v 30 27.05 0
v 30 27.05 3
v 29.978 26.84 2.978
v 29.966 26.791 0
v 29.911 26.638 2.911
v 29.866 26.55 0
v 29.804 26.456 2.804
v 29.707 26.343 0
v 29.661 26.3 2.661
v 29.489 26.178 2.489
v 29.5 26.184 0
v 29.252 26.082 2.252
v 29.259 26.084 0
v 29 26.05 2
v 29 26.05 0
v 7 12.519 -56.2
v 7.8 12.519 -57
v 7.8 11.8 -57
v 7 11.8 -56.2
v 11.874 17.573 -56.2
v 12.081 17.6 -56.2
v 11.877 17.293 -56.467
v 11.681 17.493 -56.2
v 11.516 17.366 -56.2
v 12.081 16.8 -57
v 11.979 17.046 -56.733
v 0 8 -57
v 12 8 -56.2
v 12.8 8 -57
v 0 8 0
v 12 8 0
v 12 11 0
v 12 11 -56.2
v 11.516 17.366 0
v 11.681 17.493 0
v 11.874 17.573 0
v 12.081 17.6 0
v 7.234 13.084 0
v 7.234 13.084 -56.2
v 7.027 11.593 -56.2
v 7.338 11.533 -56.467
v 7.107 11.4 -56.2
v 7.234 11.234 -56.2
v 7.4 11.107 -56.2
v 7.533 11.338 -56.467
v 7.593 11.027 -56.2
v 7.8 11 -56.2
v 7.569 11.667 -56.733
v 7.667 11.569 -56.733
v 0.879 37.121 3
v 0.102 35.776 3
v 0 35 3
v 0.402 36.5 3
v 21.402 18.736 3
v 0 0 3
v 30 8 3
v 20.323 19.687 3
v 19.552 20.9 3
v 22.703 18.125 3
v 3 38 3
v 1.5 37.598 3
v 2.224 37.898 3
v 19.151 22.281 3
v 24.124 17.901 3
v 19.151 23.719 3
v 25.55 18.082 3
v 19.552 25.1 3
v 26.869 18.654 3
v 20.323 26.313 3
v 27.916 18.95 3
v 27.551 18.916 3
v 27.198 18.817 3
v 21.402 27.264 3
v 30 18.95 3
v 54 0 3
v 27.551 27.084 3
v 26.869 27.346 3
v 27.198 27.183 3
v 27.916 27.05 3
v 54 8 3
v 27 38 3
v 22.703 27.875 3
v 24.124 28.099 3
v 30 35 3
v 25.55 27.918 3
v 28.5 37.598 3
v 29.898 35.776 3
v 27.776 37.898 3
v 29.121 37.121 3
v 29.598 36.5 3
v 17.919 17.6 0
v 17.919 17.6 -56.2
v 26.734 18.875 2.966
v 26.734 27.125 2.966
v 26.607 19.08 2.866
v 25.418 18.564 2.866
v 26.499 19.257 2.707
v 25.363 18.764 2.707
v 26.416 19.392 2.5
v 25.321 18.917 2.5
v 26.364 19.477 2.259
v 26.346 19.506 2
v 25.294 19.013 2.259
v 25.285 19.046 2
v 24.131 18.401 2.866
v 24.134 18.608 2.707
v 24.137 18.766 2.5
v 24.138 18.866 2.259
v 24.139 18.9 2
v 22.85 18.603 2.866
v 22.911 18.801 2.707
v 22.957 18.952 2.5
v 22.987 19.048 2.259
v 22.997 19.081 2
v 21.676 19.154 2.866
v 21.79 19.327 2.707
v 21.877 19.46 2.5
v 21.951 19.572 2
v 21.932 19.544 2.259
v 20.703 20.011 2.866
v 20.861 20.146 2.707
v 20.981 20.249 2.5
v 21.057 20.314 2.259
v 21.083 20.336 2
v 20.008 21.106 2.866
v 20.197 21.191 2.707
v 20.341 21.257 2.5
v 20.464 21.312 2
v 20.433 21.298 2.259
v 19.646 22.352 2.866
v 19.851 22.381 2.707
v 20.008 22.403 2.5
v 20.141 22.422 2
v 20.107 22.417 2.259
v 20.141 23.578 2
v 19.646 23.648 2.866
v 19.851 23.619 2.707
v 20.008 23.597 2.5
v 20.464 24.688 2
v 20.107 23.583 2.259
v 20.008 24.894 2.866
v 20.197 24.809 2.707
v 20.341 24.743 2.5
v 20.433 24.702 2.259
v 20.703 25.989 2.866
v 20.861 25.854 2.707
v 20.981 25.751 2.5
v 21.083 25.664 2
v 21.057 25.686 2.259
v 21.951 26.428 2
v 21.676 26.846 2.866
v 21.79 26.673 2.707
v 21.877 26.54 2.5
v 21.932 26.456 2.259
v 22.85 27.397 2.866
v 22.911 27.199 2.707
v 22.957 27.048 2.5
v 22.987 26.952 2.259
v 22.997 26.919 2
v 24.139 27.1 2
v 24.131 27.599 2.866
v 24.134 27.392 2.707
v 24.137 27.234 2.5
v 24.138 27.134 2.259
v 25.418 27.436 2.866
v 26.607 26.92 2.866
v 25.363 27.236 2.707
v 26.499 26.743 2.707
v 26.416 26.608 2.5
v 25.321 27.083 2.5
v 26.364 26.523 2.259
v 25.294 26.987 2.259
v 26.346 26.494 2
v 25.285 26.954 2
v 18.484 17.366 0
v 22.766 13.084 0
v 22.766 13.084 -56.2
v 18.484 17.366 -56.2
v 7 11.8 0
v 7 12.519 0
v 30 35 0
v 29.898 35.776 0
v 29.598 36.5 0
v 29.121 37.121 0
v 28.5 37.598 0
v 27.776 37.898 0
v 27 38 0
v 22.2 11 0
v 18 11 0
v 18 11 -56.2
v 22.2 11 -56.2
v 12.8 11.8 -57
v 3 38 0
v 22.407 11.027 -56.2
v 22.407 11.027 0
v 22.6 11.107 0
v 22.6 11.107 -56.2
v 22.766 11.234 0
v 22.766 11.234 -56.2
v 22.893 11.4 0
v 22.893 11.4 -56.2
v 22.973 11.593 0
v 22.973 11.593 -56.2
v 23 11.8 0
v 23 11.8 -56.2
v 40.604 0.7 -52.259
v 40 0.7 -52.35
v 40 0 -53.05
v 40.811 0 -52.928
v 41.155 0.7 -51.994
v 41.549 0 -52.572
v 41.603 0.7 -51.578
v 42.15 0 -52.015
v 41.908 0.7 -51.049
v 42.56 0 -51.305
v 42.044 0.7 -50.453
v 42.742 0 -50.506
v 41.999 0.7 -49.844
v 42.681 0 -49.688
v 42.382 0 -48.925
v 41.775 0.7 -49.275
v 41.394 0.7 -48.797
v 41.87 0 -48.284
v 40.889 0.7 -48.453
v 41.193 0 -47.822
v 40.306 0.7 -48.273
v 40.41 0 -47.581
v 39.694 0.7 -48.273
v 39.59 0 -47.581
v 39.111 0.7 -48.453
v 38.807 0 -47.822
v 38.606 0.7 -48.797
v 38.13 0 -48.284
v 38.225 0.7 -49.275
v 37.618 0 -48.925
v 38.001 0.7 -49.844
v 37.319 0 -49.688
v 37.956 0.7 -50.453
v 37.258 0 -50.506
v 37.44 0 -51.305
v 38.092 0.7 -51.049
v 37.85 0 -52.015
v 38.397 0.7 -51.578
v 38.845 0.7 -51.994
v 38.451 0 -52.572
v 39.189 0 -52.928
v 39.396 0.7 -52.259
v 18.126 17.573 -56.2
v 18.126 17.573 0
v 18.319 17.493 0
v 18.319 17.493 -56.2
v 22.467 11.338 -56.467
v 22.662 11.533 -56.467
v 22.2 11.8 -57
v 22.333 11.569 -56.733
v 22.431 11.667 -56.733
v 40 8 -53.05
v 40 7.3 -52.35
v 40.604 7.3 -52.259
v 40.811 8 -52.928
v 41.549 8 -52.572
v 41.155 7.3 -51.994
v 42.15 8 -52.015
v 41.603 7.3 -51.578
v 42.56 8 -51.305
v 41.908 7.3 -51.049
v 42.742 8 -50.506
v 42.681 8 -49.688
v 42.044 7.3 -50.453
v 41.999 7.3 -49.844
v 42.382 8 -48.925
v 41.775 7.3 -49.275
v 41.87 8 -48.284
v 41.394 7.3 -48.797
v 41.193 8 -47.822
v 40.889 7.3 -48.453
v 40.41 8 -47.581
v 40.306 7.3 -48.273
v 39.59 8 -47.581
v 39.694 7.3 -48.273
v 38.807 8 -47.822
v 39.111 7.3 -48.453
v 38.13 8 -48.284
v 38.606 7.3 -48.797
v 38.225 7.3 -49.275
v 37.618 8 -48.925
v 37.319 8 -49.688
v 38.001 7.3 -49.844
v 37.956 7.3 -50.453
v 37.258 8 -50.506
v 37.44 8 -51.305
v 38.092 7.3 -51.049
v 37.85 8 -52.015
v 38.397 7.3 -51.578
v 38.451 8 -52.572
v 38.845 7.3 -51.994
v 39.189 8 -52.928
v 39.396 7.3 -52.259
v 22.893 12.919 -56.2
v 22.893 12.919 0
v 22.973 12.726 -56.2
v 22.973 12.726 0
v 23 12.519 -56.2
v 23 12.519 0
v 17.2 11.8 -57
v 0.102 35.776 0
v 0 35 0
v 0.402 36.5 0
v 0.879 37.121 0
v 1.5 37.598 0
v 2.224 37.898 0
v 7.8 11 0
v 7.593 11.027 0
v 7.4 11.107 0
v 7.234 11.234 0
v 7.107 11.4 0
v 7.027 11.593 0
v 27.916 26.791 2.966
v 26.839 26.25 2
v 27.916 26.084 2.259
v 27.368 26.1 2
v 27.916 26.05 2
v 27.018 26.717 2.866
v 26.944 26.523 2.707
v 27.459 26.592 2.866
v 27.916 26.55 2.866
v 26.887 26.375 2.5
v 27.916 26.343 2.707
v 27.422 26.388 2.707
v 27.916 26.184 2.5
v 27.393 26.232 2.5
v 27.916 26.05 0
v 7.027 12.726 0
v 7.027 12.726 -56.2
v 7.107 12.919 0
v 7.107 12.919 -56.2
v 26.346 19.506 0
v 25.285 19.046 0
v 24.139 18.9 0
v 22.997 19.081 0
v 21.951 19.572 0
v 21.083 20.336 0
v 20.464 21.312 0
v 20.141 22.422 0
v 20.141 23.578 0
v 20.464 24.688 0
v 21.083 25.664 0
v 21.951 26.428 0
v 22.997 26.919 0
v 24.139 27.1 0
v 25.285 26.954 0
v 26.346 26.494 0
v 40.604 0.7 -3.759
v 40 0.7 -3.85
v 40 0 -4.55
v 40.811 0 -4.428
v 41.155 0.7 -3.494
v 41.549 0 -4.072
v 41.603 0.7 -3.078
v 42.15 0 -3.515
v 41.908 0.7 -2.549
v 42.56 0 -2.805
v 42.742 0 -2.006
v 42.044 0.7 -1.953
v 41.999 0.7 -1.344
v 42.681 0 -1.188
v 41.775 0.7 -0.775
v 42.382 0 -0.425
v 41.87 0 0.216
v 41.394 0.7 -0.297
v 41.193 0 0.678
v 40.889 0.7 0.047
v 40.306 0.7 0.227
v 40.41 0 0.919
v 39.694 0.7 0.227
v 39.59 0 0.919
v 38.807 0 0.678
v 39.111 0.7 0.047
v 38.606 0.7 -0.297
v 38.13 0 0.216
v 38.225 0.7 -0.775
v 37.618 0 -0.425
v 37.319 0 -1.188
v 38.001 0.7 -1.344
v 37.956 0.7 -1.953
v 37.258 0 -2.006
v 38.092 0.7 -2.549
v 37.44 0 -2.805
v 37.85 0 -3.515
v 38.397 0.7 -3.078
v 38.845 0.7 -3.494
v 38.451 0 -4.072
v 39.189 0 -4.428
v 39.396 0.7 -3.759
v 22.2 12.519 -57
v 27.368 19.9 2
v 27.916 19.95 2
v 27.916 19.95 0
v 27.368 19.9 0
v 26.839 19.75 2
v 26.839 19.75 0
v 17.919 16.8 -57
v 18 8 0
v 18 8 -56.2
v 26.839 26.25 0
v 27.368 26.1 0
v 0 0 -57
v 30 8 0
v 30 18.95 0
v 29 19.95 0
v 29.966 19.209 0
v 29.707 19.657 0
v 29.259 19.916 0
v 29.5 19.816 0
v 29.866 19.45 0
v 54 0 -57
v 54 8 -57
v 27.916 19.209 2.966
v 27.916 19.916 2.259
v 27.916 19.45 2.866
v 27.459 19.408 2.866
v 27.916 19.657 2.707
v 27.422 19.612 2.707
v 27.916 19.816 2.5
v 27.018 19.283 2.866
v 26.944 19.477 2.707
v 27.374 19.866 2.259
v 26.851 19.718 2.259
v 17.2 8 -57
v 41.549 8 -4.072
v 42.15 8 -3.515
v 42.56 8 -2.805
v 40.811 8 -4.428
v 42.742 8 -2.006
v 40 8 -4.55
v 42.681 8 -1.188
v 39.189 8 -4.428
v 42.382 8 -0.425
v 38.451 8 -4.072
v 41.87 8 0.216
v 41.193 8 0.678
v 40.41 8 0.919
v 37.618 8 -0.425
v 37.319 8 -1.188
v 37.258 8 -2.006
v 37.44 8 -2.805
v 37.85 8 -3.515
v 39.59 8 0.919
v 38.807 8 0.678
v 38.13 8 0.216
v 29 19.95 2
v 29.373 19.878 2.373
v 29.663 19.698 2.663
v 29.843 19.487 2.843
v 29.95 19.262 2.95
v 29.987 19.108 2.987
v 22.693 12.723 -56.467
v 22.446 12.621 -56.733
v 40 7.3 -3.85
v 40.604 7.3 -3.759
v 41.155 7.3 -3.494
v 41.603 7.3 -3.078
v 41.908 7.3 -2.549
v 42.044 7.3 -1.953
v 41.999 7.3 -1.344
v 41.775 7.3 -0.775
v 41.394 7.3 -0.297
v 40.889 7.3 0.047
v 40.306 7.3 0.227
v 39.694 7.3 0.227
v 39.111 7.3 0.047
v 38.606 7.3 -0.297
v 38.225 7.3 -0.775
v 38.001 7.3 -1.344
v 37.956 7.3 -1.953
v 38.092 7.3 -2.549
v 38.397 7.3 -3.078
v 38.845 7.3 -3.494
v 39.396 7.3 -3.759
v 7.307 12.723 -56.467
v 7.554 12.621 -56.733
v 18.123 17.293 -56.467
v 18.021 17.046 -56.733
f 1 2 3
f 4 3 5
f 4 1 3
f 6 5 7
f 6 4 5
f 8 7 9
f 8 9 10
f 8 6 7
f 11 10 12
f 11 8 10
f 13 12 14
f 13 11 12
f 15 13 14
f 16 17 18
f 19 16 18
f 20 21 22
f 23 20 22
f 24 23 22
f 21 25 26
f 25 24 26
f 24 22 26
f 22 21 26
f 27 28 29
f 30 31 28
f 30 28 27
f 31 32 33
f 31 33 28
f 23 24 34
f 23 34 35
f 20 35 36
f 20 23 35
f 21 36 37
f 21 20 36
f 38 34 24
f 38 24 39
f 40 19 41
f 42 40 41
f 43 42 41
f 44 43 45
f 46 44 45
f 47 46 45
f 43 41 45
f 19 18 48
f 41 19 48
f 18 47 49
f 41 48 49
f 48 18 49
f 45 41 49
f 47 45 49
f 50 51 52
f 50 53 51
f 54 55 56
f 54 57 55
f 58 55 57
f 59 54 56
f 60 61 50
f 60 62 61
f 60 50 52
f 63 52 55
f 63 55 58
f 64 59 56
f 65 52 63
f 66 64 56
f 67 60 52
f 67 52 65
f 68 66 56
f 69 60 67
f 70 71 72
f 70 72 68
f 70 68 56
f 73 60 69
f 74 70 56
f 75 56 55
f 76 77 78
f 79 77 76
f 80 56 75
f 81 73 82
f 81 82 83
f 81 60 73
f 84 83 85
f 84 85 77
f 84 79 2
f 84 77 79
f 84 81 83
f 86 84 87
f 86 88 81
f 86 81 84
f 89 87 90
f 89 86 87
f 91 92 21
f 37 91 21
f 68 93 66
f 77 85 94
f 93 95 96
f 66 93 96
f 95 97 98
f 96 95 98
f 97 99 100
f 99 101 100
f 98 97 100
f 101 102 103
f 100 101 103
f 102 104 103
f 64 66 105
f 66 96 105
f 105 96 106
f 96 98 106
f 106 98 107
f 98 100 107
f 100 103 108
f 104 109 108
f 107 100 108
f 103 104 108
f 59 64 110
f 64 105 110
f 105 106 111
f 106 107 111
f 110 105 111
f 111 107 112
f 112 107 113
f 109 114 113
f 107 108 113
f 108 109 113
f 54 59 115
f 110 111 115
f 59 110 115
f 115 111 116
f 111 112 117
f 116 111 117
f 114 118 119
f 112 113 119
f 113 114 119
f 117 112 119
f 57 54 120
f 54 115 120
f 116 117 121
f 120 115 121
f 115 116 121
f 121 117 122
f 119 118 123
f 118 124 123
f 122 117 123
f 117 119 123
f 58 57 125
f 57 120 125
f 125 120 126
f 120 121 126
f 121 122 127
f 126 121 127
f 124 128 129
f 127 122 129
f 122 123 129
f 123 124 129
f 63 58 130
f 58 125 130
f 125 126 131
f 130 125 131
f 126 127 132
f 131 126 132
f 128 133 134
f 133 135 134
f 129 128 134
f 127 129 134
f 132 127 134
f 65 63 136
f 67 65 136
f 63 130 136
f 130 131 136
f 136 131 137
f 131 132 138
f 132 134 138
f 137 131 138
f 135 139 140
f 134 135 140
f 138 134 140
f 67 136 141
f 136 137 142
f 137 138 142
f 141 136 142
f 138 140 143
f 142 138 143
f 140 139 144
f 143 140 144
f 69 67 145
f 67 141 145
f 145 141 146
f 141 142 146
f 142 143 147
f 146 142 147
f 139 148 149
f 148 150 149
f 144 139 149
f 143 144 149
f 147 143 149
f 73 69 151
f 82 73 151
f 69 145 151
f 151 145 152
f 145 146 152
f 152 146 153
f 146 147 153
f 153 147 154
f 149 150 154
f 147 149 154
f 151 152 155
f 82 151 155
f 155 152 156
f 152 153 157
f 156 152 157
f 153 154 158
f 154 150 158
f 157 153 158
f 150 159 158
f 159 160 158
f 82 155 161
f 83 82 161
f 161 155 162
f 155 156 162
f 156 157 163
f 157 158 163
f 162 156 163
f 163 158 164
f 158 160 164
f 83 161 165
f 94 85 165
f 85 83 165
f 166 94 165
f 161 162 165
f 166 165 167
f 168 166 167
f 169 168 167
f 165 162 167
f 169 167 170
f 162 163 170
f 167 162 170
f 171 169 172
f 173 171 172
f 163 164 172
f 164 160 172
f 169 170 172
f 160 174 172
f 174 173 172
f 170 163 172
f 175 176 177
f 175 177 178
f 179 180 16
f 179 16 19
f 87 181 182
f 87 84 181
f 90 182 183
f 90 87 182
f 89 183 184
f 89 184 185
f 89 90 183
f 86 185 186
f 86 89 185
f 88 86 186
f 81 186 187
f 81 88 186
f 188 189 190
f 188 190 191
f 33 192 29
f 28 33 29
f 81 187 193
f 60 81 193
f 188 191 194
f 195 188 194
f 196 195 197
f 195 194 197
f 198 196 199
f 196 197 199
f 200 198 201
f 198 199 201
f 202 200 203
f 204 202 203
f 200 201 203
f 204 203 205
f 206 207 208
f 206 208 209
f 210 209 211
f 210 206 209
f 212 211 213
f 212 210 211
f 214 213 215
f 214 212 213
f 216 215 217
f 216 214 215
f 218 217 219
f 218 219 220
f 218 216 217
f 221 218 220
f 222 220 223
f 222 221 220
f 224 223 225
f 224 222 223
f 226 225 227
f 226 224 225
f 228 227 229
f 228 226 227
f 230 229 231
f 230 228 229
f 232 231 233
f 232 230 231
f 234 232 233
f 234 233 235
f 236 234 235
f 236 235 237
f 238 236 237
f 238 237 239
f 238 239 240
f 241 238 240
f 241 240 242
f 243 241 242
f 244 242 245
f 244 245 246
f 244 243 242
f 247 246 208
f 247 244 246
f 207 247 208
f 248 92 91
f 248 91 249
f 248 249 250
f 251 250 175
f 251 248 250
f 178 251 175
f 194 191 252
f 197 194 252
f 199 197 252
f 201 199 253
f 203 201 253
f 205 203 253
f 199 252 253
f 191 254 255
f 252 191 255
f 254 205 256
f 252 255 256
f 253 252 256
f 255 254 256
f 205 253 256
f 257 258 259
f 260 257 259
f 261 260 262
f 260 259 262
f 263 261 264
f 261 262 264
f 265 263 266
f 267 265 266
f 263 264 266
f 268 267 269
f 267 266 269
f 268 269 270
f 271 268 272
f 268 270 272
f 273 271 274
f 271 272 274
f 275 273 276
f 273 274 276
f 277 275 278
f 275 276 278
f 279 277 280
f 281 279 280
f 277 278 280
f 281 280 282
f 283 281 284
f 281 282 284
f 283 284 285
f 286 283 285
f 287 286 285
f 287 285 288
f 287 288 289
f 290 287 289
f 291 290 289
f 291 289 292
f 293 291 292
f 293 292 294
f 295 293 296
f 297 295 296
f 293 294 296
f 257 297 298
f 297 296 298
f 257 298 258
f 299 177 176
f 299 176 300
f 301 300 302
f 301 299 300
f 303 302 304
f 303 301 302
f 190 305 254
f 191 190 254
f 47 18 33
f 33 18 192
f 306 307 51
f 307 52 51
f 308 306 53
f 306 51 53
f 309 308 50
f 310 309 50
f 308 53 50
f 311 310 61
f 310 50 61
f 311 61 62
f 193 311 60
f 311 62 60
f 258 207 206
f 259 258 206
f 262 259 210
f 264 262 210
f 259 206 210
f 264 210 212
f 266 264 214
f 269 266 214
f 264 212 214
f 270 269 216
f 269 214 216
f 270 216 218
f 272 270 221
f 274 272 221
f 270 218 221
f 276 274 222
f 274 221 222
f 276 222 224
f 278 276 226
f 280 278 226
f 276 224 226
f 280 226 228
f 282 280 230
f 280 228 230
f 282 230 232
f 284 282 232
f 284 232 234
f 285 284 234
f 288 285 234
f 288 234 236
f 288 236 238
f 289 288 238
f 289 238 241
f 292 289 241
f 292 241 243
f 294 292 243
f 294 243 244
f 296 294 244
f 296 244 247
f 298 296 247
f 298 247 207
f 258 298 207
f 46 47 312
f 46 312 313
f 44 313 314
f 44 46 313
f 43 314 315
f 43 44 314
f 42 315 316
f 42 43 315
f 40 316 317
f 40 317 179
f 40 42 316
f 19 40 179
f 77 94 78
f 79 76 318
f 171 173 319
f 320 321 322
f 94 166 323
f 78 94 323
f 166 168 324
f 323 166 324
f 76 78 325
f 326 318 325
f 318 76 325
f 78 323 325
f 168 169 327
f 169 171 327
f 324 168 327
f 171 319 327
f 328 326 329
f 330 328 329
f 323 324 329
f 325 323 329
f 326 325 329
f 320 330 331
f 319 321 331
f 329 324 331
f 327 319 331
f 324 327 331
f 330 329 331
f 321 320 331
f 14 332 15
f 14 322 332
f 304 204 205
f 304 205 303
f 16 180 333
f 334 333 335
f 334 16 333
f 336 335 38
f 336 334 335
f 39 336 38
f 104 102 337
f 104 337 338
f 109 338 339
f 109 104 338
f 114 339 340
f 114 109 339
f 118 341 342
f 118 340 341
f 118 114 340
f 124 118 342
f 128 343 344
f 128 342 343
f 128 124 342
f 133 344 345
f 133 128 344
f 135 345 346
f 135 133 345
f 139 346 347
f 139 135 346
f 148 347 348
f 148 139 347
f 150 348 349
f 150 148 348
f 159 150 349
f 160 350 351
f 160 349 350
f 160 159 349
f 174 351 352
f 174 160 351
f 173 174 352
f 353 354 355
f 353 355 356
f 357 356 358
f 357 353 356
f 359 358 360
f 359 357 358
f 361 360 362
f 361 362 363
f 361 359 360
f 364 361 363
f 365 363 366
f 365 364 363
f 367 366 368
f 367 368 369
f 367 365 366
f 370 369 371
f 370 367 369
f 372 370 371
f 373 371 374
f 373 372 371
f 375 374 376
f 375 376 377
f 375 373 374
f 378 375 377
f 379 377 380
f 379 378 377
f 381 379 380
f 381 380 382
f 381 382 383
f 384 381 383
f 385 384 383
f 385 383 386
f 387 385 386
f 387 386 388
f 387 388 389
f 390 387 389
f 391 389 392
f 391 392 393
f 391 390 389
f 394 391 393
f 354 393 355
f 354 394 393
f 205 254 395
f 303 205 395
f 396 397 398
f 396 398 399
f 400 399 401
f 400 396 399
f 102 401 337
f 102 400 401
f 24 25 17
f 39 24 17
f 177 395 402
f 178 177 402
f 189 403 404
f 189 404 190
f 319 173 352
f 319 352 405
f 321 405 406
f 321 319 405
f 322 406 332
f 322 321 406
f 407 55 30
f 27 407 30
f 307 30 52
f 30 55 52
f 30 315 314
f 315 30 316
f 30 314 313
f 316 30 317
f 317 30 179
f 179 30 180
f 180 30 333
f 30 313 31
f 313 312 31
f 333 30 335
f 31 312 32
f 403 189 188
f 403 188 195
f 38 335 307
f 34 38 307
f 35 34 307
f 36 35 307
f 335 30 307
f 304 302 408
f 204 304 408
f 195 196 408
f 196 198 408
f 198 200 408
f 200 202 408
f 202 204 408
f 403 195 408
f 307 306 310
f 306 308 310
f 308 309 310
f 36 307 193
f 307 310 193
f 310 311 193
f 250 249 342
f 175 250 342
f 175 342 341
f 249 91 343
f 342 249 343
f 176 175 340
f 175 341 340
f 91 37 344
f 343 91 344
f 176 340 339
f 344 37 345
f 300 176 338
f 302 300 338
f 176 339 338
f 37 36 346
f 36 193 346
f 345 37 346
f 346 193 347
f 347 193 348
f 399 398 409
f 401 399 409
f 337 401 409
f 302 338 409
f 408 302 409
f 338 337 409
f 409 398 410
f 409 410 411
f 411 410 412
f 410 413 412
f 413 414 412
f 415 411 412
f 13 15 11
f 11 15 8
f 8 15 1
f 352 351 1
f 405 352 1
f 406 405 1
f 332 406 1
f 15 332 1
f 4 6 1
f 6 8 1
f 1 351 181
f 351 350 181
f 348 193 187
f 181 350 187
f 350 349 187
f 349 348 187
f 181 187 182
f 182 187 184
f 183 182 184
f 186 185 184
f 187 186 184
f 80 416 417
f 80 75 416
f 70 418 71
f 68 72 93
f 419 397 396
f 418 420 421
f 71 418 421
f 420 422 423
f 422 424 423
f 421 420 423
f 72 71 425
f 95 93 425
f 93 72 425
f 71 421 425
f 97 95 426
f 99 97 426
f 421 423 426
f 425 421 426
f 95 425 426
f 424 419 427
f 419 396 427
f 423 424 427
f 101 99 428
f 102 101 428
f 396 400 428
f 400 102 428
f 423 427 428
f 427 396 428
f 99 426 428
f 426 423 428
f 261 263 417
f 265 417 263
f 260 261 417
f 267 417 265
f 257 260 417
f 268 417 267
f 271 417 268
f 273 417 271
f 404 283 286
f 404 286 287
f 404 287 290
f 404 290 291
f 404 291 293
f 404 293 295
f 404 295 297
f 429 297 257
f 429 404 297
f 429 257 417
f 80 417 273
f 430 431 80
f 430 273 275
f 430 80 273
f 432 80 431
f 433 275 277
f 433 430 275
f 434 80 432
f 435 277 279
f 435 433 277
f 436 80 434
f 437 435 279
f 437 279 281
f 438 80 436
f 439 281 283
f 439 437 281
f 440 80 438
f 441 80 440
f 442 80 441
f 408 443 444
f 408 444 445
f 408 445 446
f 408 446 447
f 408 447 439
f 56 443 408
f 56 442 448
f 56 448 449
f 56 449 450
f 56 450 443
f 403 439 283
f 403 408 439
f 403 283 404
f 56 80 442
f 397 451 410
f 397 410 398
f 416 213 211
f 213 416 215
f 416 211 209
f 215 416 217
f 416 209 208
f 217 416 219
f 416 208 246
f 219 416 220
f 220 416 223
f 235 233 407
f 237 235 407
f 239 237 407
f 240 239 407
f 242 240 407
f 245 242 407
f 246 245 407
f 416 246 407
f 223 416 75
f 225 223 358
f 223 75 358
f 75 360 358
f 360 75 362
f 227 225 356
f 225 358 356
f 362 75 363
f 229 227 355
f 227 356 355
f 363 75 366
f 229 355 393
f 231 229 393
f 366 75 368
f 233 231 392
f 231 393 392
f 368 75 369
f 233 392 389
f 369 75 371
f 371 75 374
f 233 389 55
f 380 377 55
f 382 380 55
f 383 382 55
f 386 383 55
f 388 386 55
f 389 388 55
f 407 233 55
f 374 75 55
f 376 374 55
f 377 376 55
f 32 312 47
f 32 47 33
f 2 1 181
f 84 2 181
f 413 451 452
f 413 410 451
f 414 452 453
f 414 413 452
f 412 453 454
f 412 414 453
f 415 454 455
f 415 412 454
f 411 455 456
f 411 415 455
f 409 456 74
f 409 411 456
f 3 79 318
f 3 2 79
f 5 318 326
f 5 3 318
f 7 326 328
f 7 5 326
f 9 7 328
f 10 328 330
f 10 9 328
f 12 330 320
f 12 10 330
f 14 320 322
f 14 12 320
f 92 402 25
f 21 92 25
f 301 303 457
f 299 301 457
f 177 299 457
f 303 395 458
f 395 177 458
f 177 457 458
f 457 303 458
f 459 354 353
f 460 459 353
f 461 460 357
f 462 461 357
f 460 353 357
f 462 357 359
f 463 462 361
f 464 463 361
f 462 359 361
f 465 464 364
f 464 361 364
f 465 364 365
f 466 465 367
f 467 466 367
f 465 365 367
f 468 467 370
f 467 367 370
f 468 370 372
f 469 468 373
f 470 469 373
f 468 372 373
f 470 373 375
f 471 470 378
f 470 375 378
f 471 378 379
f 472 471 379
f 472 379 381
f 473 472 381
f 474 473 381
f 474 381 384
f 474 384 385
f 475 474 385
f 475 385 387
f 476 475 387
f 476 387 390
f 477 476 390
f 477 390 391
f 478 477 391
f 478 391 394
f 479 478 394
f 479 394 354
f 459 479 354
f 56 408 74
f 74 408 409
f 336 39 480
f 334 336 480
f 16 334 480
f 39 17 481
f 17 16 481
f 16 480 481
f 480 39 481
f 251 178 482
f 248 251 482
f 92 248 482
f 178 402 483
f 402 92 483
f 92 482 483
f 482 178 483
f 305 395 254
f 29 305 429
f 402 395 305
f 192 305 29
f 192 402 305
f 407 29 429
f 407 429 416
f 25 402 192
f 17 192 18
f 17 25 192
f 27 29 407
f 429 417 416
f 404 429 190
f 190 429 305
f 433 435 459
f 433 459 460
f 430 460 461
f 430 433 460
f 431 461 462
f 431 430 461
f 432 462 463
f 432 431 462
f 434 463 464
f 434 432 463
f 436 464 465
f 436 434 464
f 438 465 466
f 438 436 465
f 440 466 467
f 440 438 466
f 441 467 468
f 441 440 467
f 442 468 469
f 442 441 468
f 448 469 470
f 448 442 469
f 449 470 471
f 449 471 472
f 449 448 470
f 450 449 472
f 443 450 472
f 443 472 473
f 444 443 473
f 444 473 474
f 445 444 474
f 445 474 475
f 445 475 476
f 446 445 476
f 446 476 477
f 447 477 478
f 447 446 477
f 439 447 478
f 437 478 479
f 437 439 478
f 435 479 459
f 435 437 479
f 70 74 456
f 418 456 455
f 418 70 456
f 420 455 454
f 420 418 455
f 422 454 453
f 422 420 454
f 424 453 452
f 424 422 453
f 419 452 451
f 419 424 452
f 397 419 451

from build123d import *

# Parameters (mm, degrees)
BOSS_EXTRUDE1_DEPTH = 3
SKETCH2_W           = 54
SKETCH2_H           = 8
BOSS_EXTRUDE2_DEPTH = 57
SKETCH3_R           = 2.05
CUT_EXTRUDE1_DEPTH  = 57
BOSS_EXTRUDE3_DEPTH = 57
FILLET1_R           = 3
CUT_EXTRUDE2_DEPTH  = 6
FILLET2_R           = 1
FILLET3_R           = 0.8
CHAMFER1_SIZE       = 0.8
CHAMFER2_SIZE       = 0.7


with BuildPart() as part:
    # Sketch1 → Boss-Extrude1 (new body)
    with BuildSketch(Plane.XY):
        Polygon((54, 0), (54, 8), (30, 8), (30, 38), (0, 38), (0, 0), align=None)
    extrude(amount=BOSS_EXTRUDE1_DEPTH)

    # Sketch2 → Boss-Extrude2 (add)
    with BuildSketch(Plane(origin=(0, 0, 0), x_dir=(-1, 0, 0), z_dir=(0, 0, -1))):
        with Locations((-27, 4)):
            Rectangle(SKETCH2_W, SKETCH2_H)
    extrude(amount=BOSS_EXTRUDE2_DEPTH)

    # Sketch3 → Cut-Extrude1 (cut)
    with BuildSketch(Plane.XZ):
        with Locations(Location((40, -1.8, 0), (0, 0, 270))):
            Circle(SKETCH3_R)
        with Locations(Location((40, -50.3, 0), (0, 0, 270))):
            Circle(SKETCH3_R)
    extrude(amount=-CUT_EXTRUDE1_DEPTH, mode=Mode.SUBTRACT)

    # Sketch4 → Boss-Extrude3 (add)
    with BuildSketch(Plane(origin=(0, 0, 0), x_dir=(-1, 0, 0), z_dir=(0, 0, -1))):
        Polygon((-18, 8), (-18, 11), (-23, 11), (-23, 12.85), (-18.25, 17.6), (-11.75, 17.6), (-7, 12.85), (-7, 11), (-12, 11), (-12, 8), align=None)
    extrude(amount=BOSS_EXTRUDE3_DEPTH)

    # Fillet1
    fillet1_edges = [part.edges().sort_by_distance(p)[0] for p in [
        (0, 38, 1.5),
        (30, 38, 1.5),
    ]]
    fillet(fillet1_edges, radius=FILLET1_R)

    # Sketch5 → Cut-Extrude2 (cut)
    with BuildSketch(Plane.XY.offset(3)):
        with BuildLine():
            Line((27.915844453, 26.05), (30, 26.05))
            Line((30, 26.05), (30, 19.95))
            Line((30, 19.95), (27.915844453, 19.95))
            ThreePointArc((27.915844453, 19.95), (27.100066936, 19.836954631), (26.345769332, 19.506338028))
            ThreePointArc((26.345769332, 19.506338028), (20.1, 23), (26.345769332, 26.493661972))
            ThreePointArc((26.345769332, 26.493661972), (27.100066936, 26.163045369), (27.915844453, 26.05))
        make_face()
    extrude(amount=-CUT_EXTRUDE2_DEPTH, mode=Mode.SUBTRACT)

    # Fillet2
    fillet2_edges = [part.edges().sort_by_distance(p)[0] for p in [
        (30, 26.05, 1.5),
        (30, 19.95, 1.5),
        (28.957922227, 26.05, 3),
        (27.100066936, 26.163045369, 3),
        (20.1, 23, 3),
        (27.100066936, 19.836954631, 3),
        (28.957922227, 19.95, 3),
    ]]
    fillet(fillet2_edges, radius=FILLET2_R)

    # Fillet3
    fillet3_edges = [part.edges().sort_by_distance(p)[0] for p in [
        (7, 11, -28.5),
        (7, 12.85, -28.5),
        (11.75, 17.6, -28.5),
        (18.25, 17.6, -28.5),
        (23, 12.85, -28.5),
        (23, 11, -28.5),
    ]]
    fillet(fillet3_edges, radius=FILLET3_R)

    # Chamfer1
    chamfer1_edges = [part.edges().sort_by_distance(p)[0] for p in [
        (20.1, 11, -57),
        (23, 12.159314575, -57),
        (7, 12.159314575, -57),
        (9.375, 15.225, -57),
        (15, 17.6, -57),
        (20.625, 15.225, -57),
        (22.939103626, 12.824775896, -57),
        (18.224775896, 17.539103626, -57),
        (11.775224104, 17.539103626, -57),
        (7.060896374, 12.824775896, -57),
        (7.234314575, 11.234314575, -57),
        (22.765685425, 11.234314575, -57),
        (12, 9.5, -57),
        (9.9, 11, -57),
        (18, 9.5, -57),
    ]]
    chamfer(chamfer1_edges, length=CHAMFER1_SIZE)

    # Chamfer2
    chamfer2_edges = [part.edges().sort_by_distance(p)[0] for p in [
        (40, 8, -48.25),
        (40, 0, -48.25),
        (40, 8, 0.25),
        (40, 0, 0.25),
    ]]
    chamfer(chamfer2_edges, length=CHAMFER2_SIZE)


solid = part.part
